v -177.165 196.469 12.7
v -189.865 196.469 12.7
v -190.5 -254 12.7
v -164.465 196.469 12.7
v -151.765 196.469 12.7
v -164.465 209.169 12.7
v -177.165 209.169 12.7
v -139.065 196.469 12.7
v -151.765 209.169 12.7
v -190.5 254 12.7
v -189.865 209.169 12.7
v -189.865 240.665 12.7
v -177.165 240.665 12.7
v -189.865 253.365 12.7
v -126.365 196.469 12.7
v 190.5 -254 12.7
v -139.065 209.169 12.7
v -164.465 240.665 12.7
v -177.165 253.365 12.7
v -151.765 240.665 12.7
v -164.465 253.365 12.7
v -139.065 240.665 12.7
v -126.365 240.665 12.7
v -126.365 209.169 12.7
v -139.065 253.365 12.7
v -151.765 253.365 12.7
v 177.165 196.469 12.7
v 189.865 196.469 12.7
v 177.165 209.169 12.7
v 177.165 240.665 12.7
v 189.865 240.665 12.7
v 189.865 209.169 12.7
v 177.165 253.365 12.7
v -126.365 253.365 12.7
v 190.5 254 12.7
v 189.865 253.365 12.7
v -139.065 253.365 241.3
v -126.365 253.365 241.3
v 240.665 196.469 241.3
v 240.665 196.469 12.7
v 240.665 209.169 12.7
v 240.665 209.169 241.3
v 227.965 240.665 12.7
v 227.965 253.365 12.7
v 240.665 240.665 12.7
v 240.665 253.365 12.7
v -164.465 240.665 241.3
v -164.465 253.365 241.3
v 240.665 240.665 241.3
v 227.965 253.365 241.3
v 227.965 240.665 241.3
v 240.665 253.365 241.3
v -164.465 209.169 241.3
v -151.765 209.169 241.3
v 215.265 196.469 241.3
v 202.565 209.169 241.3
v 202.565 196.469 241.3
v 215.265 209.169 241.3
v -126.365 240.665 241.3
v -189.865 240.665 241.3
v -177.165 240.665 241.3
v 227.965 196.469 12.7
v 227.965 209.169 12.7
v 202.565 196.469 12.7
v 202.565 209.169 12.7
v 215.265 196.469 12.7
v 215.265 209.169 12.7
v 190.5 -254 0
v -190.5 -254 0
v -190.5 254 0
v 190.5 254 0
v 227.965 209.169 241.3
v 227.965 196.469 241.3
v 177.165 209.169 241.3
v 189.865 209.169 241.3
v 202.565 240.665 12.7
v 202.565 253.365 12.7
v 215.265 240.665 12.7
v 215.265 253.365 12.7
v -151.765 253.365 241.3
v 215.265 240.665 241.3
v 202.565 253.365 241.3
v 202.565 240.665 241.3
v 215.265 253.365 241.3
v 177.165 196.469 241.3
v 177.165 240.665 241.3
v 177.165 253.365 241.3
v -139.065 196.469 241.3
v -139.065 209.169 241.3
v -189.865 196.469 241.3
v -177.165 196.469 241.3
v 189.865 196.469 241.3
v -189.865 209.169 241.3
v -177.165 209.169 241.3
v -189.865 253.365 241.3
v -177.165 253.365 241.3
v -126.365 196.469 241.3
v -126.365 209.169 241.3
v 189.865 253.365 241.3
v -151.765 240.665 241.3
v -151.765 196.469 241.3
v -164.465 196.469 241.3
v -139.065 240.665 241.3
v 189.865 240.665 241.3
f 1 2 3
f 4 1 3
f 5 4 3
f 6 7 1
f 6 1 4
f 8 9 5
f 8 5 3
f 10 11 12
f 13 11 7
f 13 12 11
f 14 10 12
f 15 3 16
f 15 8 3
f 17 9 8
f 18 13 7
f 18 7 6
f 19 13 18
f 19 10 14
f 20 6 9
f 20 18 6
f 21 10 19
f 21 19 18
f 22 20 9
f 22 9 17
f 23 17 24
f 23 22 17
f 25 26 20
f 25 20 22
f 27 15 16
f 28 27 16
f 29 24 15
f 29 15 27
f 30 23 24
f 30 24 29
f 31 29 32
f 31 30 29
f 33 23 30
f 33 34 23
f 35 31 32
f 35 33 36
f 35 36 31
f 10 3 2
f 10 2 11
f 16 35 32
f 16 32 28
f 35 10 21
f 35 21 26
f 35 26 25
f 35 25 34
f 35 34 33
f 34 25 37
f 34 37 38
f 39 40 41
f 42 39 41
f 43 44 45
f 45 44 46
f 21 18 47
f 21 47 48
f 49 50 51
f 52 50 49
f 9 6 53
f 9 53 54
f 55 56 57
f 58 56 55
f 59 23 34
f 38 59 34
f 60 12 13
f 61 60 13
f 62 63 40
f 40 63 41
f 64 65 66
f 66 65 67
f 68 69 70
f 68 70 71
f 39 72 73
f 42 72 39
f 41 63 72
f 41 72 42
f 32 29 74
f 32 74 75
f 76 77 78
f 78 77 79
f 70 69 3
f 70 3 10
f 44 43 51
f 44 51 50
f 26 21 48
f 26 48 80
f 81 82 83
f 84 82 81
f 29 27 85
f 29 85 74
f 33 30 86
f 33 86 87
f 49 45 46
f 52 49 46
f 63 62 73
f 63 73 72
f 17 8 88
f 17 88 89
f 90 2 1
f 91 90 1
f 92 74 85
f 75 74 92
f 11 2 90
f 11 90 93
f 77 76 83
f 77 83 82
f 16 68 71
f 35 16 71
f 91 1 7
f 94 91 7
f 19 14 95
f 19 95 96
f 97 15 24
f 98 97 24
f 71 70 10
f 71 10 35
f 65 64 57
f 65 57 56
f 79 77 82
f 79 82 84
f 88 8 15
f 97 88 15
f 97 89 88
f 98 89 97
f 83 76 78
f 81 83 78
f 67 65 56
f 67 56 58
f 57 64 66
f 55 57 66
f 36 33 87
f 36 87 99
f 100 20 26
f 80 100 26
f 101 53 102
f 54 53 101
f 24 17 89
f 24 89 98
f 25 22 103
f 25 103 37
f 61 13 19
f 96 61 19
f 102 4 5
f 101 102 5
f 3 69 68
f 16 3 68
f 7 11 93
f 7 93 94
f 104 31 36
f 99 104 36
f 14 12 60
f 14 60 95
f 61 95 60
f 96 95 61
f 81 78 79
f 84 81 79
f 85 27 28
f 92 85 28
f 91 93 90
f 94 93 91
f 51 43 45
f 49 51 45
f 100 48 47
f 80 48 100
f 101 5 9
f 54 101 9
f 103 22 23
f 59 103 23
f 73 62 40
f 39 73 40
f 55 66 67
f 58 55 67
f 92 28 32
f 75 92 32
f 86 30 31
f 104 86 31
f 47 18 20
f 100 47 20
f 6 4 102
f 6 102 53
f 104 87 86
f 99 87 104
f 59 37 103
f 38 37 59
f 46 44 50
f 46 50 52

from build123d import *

# Parameters (mm, degrees)
F0_W     = 381
F0_H     = 508
F1_DEPTH = 12.7
F2_W     = 12.7
F2_H     = 12.7
F3_DEPTH = 228.6


with BuildPart() as f1:
    # F0 (on Top) → F1 (new body)
    with BuildSketch(Plane.XY):
        Rectangle(F0_W, F0_H)
    extrude(amount=F1_DEPTH)

    # F2 (on face) → F3 (join)
    with BuildSketch(Plane.XY.offset(12.7)):
        with Locations((-183.515, 247.015)):
            Rectangle(F2_W, F2_H)
        with Locations((183.515, 247.015)):
            Rectangle(F2_W, F2_H)
        with Locations((-183.515, 202.819)):
            Rectangle(F2_W, F2_H)
        with Locations((183.515, 202.819)):
            Rectangle(F2_W, F2_H)
        with Locations((-158.115, 247.015)):
            Rectangle(F2_W, F2_H)
        with Locations((208.915, 247.015)):
            Rectangle(F2_W, F2_H)
        with Locations((-158.115, 202.819)):
            Rectangle(F2_W, F2_H)
        with Locations((208.915, 202.819)):
            Rectangle(F2_W, F2_H)
        with Locations((-132.715, 247.015)):
            Rectangle(F2_W, F2_H)
        with Locations((234.315, 247.015)):
            Rectangle(F2_W, F2_H)
        with Locations((-132.715, 202.819)):
            Rectangle(F2_W, F2_H)
        with Locations((234.315, 202.819)):
            Rectangle(F2_W, F2_H)
    extrude(amount=F3_DEPTH)


solid = f1.part
